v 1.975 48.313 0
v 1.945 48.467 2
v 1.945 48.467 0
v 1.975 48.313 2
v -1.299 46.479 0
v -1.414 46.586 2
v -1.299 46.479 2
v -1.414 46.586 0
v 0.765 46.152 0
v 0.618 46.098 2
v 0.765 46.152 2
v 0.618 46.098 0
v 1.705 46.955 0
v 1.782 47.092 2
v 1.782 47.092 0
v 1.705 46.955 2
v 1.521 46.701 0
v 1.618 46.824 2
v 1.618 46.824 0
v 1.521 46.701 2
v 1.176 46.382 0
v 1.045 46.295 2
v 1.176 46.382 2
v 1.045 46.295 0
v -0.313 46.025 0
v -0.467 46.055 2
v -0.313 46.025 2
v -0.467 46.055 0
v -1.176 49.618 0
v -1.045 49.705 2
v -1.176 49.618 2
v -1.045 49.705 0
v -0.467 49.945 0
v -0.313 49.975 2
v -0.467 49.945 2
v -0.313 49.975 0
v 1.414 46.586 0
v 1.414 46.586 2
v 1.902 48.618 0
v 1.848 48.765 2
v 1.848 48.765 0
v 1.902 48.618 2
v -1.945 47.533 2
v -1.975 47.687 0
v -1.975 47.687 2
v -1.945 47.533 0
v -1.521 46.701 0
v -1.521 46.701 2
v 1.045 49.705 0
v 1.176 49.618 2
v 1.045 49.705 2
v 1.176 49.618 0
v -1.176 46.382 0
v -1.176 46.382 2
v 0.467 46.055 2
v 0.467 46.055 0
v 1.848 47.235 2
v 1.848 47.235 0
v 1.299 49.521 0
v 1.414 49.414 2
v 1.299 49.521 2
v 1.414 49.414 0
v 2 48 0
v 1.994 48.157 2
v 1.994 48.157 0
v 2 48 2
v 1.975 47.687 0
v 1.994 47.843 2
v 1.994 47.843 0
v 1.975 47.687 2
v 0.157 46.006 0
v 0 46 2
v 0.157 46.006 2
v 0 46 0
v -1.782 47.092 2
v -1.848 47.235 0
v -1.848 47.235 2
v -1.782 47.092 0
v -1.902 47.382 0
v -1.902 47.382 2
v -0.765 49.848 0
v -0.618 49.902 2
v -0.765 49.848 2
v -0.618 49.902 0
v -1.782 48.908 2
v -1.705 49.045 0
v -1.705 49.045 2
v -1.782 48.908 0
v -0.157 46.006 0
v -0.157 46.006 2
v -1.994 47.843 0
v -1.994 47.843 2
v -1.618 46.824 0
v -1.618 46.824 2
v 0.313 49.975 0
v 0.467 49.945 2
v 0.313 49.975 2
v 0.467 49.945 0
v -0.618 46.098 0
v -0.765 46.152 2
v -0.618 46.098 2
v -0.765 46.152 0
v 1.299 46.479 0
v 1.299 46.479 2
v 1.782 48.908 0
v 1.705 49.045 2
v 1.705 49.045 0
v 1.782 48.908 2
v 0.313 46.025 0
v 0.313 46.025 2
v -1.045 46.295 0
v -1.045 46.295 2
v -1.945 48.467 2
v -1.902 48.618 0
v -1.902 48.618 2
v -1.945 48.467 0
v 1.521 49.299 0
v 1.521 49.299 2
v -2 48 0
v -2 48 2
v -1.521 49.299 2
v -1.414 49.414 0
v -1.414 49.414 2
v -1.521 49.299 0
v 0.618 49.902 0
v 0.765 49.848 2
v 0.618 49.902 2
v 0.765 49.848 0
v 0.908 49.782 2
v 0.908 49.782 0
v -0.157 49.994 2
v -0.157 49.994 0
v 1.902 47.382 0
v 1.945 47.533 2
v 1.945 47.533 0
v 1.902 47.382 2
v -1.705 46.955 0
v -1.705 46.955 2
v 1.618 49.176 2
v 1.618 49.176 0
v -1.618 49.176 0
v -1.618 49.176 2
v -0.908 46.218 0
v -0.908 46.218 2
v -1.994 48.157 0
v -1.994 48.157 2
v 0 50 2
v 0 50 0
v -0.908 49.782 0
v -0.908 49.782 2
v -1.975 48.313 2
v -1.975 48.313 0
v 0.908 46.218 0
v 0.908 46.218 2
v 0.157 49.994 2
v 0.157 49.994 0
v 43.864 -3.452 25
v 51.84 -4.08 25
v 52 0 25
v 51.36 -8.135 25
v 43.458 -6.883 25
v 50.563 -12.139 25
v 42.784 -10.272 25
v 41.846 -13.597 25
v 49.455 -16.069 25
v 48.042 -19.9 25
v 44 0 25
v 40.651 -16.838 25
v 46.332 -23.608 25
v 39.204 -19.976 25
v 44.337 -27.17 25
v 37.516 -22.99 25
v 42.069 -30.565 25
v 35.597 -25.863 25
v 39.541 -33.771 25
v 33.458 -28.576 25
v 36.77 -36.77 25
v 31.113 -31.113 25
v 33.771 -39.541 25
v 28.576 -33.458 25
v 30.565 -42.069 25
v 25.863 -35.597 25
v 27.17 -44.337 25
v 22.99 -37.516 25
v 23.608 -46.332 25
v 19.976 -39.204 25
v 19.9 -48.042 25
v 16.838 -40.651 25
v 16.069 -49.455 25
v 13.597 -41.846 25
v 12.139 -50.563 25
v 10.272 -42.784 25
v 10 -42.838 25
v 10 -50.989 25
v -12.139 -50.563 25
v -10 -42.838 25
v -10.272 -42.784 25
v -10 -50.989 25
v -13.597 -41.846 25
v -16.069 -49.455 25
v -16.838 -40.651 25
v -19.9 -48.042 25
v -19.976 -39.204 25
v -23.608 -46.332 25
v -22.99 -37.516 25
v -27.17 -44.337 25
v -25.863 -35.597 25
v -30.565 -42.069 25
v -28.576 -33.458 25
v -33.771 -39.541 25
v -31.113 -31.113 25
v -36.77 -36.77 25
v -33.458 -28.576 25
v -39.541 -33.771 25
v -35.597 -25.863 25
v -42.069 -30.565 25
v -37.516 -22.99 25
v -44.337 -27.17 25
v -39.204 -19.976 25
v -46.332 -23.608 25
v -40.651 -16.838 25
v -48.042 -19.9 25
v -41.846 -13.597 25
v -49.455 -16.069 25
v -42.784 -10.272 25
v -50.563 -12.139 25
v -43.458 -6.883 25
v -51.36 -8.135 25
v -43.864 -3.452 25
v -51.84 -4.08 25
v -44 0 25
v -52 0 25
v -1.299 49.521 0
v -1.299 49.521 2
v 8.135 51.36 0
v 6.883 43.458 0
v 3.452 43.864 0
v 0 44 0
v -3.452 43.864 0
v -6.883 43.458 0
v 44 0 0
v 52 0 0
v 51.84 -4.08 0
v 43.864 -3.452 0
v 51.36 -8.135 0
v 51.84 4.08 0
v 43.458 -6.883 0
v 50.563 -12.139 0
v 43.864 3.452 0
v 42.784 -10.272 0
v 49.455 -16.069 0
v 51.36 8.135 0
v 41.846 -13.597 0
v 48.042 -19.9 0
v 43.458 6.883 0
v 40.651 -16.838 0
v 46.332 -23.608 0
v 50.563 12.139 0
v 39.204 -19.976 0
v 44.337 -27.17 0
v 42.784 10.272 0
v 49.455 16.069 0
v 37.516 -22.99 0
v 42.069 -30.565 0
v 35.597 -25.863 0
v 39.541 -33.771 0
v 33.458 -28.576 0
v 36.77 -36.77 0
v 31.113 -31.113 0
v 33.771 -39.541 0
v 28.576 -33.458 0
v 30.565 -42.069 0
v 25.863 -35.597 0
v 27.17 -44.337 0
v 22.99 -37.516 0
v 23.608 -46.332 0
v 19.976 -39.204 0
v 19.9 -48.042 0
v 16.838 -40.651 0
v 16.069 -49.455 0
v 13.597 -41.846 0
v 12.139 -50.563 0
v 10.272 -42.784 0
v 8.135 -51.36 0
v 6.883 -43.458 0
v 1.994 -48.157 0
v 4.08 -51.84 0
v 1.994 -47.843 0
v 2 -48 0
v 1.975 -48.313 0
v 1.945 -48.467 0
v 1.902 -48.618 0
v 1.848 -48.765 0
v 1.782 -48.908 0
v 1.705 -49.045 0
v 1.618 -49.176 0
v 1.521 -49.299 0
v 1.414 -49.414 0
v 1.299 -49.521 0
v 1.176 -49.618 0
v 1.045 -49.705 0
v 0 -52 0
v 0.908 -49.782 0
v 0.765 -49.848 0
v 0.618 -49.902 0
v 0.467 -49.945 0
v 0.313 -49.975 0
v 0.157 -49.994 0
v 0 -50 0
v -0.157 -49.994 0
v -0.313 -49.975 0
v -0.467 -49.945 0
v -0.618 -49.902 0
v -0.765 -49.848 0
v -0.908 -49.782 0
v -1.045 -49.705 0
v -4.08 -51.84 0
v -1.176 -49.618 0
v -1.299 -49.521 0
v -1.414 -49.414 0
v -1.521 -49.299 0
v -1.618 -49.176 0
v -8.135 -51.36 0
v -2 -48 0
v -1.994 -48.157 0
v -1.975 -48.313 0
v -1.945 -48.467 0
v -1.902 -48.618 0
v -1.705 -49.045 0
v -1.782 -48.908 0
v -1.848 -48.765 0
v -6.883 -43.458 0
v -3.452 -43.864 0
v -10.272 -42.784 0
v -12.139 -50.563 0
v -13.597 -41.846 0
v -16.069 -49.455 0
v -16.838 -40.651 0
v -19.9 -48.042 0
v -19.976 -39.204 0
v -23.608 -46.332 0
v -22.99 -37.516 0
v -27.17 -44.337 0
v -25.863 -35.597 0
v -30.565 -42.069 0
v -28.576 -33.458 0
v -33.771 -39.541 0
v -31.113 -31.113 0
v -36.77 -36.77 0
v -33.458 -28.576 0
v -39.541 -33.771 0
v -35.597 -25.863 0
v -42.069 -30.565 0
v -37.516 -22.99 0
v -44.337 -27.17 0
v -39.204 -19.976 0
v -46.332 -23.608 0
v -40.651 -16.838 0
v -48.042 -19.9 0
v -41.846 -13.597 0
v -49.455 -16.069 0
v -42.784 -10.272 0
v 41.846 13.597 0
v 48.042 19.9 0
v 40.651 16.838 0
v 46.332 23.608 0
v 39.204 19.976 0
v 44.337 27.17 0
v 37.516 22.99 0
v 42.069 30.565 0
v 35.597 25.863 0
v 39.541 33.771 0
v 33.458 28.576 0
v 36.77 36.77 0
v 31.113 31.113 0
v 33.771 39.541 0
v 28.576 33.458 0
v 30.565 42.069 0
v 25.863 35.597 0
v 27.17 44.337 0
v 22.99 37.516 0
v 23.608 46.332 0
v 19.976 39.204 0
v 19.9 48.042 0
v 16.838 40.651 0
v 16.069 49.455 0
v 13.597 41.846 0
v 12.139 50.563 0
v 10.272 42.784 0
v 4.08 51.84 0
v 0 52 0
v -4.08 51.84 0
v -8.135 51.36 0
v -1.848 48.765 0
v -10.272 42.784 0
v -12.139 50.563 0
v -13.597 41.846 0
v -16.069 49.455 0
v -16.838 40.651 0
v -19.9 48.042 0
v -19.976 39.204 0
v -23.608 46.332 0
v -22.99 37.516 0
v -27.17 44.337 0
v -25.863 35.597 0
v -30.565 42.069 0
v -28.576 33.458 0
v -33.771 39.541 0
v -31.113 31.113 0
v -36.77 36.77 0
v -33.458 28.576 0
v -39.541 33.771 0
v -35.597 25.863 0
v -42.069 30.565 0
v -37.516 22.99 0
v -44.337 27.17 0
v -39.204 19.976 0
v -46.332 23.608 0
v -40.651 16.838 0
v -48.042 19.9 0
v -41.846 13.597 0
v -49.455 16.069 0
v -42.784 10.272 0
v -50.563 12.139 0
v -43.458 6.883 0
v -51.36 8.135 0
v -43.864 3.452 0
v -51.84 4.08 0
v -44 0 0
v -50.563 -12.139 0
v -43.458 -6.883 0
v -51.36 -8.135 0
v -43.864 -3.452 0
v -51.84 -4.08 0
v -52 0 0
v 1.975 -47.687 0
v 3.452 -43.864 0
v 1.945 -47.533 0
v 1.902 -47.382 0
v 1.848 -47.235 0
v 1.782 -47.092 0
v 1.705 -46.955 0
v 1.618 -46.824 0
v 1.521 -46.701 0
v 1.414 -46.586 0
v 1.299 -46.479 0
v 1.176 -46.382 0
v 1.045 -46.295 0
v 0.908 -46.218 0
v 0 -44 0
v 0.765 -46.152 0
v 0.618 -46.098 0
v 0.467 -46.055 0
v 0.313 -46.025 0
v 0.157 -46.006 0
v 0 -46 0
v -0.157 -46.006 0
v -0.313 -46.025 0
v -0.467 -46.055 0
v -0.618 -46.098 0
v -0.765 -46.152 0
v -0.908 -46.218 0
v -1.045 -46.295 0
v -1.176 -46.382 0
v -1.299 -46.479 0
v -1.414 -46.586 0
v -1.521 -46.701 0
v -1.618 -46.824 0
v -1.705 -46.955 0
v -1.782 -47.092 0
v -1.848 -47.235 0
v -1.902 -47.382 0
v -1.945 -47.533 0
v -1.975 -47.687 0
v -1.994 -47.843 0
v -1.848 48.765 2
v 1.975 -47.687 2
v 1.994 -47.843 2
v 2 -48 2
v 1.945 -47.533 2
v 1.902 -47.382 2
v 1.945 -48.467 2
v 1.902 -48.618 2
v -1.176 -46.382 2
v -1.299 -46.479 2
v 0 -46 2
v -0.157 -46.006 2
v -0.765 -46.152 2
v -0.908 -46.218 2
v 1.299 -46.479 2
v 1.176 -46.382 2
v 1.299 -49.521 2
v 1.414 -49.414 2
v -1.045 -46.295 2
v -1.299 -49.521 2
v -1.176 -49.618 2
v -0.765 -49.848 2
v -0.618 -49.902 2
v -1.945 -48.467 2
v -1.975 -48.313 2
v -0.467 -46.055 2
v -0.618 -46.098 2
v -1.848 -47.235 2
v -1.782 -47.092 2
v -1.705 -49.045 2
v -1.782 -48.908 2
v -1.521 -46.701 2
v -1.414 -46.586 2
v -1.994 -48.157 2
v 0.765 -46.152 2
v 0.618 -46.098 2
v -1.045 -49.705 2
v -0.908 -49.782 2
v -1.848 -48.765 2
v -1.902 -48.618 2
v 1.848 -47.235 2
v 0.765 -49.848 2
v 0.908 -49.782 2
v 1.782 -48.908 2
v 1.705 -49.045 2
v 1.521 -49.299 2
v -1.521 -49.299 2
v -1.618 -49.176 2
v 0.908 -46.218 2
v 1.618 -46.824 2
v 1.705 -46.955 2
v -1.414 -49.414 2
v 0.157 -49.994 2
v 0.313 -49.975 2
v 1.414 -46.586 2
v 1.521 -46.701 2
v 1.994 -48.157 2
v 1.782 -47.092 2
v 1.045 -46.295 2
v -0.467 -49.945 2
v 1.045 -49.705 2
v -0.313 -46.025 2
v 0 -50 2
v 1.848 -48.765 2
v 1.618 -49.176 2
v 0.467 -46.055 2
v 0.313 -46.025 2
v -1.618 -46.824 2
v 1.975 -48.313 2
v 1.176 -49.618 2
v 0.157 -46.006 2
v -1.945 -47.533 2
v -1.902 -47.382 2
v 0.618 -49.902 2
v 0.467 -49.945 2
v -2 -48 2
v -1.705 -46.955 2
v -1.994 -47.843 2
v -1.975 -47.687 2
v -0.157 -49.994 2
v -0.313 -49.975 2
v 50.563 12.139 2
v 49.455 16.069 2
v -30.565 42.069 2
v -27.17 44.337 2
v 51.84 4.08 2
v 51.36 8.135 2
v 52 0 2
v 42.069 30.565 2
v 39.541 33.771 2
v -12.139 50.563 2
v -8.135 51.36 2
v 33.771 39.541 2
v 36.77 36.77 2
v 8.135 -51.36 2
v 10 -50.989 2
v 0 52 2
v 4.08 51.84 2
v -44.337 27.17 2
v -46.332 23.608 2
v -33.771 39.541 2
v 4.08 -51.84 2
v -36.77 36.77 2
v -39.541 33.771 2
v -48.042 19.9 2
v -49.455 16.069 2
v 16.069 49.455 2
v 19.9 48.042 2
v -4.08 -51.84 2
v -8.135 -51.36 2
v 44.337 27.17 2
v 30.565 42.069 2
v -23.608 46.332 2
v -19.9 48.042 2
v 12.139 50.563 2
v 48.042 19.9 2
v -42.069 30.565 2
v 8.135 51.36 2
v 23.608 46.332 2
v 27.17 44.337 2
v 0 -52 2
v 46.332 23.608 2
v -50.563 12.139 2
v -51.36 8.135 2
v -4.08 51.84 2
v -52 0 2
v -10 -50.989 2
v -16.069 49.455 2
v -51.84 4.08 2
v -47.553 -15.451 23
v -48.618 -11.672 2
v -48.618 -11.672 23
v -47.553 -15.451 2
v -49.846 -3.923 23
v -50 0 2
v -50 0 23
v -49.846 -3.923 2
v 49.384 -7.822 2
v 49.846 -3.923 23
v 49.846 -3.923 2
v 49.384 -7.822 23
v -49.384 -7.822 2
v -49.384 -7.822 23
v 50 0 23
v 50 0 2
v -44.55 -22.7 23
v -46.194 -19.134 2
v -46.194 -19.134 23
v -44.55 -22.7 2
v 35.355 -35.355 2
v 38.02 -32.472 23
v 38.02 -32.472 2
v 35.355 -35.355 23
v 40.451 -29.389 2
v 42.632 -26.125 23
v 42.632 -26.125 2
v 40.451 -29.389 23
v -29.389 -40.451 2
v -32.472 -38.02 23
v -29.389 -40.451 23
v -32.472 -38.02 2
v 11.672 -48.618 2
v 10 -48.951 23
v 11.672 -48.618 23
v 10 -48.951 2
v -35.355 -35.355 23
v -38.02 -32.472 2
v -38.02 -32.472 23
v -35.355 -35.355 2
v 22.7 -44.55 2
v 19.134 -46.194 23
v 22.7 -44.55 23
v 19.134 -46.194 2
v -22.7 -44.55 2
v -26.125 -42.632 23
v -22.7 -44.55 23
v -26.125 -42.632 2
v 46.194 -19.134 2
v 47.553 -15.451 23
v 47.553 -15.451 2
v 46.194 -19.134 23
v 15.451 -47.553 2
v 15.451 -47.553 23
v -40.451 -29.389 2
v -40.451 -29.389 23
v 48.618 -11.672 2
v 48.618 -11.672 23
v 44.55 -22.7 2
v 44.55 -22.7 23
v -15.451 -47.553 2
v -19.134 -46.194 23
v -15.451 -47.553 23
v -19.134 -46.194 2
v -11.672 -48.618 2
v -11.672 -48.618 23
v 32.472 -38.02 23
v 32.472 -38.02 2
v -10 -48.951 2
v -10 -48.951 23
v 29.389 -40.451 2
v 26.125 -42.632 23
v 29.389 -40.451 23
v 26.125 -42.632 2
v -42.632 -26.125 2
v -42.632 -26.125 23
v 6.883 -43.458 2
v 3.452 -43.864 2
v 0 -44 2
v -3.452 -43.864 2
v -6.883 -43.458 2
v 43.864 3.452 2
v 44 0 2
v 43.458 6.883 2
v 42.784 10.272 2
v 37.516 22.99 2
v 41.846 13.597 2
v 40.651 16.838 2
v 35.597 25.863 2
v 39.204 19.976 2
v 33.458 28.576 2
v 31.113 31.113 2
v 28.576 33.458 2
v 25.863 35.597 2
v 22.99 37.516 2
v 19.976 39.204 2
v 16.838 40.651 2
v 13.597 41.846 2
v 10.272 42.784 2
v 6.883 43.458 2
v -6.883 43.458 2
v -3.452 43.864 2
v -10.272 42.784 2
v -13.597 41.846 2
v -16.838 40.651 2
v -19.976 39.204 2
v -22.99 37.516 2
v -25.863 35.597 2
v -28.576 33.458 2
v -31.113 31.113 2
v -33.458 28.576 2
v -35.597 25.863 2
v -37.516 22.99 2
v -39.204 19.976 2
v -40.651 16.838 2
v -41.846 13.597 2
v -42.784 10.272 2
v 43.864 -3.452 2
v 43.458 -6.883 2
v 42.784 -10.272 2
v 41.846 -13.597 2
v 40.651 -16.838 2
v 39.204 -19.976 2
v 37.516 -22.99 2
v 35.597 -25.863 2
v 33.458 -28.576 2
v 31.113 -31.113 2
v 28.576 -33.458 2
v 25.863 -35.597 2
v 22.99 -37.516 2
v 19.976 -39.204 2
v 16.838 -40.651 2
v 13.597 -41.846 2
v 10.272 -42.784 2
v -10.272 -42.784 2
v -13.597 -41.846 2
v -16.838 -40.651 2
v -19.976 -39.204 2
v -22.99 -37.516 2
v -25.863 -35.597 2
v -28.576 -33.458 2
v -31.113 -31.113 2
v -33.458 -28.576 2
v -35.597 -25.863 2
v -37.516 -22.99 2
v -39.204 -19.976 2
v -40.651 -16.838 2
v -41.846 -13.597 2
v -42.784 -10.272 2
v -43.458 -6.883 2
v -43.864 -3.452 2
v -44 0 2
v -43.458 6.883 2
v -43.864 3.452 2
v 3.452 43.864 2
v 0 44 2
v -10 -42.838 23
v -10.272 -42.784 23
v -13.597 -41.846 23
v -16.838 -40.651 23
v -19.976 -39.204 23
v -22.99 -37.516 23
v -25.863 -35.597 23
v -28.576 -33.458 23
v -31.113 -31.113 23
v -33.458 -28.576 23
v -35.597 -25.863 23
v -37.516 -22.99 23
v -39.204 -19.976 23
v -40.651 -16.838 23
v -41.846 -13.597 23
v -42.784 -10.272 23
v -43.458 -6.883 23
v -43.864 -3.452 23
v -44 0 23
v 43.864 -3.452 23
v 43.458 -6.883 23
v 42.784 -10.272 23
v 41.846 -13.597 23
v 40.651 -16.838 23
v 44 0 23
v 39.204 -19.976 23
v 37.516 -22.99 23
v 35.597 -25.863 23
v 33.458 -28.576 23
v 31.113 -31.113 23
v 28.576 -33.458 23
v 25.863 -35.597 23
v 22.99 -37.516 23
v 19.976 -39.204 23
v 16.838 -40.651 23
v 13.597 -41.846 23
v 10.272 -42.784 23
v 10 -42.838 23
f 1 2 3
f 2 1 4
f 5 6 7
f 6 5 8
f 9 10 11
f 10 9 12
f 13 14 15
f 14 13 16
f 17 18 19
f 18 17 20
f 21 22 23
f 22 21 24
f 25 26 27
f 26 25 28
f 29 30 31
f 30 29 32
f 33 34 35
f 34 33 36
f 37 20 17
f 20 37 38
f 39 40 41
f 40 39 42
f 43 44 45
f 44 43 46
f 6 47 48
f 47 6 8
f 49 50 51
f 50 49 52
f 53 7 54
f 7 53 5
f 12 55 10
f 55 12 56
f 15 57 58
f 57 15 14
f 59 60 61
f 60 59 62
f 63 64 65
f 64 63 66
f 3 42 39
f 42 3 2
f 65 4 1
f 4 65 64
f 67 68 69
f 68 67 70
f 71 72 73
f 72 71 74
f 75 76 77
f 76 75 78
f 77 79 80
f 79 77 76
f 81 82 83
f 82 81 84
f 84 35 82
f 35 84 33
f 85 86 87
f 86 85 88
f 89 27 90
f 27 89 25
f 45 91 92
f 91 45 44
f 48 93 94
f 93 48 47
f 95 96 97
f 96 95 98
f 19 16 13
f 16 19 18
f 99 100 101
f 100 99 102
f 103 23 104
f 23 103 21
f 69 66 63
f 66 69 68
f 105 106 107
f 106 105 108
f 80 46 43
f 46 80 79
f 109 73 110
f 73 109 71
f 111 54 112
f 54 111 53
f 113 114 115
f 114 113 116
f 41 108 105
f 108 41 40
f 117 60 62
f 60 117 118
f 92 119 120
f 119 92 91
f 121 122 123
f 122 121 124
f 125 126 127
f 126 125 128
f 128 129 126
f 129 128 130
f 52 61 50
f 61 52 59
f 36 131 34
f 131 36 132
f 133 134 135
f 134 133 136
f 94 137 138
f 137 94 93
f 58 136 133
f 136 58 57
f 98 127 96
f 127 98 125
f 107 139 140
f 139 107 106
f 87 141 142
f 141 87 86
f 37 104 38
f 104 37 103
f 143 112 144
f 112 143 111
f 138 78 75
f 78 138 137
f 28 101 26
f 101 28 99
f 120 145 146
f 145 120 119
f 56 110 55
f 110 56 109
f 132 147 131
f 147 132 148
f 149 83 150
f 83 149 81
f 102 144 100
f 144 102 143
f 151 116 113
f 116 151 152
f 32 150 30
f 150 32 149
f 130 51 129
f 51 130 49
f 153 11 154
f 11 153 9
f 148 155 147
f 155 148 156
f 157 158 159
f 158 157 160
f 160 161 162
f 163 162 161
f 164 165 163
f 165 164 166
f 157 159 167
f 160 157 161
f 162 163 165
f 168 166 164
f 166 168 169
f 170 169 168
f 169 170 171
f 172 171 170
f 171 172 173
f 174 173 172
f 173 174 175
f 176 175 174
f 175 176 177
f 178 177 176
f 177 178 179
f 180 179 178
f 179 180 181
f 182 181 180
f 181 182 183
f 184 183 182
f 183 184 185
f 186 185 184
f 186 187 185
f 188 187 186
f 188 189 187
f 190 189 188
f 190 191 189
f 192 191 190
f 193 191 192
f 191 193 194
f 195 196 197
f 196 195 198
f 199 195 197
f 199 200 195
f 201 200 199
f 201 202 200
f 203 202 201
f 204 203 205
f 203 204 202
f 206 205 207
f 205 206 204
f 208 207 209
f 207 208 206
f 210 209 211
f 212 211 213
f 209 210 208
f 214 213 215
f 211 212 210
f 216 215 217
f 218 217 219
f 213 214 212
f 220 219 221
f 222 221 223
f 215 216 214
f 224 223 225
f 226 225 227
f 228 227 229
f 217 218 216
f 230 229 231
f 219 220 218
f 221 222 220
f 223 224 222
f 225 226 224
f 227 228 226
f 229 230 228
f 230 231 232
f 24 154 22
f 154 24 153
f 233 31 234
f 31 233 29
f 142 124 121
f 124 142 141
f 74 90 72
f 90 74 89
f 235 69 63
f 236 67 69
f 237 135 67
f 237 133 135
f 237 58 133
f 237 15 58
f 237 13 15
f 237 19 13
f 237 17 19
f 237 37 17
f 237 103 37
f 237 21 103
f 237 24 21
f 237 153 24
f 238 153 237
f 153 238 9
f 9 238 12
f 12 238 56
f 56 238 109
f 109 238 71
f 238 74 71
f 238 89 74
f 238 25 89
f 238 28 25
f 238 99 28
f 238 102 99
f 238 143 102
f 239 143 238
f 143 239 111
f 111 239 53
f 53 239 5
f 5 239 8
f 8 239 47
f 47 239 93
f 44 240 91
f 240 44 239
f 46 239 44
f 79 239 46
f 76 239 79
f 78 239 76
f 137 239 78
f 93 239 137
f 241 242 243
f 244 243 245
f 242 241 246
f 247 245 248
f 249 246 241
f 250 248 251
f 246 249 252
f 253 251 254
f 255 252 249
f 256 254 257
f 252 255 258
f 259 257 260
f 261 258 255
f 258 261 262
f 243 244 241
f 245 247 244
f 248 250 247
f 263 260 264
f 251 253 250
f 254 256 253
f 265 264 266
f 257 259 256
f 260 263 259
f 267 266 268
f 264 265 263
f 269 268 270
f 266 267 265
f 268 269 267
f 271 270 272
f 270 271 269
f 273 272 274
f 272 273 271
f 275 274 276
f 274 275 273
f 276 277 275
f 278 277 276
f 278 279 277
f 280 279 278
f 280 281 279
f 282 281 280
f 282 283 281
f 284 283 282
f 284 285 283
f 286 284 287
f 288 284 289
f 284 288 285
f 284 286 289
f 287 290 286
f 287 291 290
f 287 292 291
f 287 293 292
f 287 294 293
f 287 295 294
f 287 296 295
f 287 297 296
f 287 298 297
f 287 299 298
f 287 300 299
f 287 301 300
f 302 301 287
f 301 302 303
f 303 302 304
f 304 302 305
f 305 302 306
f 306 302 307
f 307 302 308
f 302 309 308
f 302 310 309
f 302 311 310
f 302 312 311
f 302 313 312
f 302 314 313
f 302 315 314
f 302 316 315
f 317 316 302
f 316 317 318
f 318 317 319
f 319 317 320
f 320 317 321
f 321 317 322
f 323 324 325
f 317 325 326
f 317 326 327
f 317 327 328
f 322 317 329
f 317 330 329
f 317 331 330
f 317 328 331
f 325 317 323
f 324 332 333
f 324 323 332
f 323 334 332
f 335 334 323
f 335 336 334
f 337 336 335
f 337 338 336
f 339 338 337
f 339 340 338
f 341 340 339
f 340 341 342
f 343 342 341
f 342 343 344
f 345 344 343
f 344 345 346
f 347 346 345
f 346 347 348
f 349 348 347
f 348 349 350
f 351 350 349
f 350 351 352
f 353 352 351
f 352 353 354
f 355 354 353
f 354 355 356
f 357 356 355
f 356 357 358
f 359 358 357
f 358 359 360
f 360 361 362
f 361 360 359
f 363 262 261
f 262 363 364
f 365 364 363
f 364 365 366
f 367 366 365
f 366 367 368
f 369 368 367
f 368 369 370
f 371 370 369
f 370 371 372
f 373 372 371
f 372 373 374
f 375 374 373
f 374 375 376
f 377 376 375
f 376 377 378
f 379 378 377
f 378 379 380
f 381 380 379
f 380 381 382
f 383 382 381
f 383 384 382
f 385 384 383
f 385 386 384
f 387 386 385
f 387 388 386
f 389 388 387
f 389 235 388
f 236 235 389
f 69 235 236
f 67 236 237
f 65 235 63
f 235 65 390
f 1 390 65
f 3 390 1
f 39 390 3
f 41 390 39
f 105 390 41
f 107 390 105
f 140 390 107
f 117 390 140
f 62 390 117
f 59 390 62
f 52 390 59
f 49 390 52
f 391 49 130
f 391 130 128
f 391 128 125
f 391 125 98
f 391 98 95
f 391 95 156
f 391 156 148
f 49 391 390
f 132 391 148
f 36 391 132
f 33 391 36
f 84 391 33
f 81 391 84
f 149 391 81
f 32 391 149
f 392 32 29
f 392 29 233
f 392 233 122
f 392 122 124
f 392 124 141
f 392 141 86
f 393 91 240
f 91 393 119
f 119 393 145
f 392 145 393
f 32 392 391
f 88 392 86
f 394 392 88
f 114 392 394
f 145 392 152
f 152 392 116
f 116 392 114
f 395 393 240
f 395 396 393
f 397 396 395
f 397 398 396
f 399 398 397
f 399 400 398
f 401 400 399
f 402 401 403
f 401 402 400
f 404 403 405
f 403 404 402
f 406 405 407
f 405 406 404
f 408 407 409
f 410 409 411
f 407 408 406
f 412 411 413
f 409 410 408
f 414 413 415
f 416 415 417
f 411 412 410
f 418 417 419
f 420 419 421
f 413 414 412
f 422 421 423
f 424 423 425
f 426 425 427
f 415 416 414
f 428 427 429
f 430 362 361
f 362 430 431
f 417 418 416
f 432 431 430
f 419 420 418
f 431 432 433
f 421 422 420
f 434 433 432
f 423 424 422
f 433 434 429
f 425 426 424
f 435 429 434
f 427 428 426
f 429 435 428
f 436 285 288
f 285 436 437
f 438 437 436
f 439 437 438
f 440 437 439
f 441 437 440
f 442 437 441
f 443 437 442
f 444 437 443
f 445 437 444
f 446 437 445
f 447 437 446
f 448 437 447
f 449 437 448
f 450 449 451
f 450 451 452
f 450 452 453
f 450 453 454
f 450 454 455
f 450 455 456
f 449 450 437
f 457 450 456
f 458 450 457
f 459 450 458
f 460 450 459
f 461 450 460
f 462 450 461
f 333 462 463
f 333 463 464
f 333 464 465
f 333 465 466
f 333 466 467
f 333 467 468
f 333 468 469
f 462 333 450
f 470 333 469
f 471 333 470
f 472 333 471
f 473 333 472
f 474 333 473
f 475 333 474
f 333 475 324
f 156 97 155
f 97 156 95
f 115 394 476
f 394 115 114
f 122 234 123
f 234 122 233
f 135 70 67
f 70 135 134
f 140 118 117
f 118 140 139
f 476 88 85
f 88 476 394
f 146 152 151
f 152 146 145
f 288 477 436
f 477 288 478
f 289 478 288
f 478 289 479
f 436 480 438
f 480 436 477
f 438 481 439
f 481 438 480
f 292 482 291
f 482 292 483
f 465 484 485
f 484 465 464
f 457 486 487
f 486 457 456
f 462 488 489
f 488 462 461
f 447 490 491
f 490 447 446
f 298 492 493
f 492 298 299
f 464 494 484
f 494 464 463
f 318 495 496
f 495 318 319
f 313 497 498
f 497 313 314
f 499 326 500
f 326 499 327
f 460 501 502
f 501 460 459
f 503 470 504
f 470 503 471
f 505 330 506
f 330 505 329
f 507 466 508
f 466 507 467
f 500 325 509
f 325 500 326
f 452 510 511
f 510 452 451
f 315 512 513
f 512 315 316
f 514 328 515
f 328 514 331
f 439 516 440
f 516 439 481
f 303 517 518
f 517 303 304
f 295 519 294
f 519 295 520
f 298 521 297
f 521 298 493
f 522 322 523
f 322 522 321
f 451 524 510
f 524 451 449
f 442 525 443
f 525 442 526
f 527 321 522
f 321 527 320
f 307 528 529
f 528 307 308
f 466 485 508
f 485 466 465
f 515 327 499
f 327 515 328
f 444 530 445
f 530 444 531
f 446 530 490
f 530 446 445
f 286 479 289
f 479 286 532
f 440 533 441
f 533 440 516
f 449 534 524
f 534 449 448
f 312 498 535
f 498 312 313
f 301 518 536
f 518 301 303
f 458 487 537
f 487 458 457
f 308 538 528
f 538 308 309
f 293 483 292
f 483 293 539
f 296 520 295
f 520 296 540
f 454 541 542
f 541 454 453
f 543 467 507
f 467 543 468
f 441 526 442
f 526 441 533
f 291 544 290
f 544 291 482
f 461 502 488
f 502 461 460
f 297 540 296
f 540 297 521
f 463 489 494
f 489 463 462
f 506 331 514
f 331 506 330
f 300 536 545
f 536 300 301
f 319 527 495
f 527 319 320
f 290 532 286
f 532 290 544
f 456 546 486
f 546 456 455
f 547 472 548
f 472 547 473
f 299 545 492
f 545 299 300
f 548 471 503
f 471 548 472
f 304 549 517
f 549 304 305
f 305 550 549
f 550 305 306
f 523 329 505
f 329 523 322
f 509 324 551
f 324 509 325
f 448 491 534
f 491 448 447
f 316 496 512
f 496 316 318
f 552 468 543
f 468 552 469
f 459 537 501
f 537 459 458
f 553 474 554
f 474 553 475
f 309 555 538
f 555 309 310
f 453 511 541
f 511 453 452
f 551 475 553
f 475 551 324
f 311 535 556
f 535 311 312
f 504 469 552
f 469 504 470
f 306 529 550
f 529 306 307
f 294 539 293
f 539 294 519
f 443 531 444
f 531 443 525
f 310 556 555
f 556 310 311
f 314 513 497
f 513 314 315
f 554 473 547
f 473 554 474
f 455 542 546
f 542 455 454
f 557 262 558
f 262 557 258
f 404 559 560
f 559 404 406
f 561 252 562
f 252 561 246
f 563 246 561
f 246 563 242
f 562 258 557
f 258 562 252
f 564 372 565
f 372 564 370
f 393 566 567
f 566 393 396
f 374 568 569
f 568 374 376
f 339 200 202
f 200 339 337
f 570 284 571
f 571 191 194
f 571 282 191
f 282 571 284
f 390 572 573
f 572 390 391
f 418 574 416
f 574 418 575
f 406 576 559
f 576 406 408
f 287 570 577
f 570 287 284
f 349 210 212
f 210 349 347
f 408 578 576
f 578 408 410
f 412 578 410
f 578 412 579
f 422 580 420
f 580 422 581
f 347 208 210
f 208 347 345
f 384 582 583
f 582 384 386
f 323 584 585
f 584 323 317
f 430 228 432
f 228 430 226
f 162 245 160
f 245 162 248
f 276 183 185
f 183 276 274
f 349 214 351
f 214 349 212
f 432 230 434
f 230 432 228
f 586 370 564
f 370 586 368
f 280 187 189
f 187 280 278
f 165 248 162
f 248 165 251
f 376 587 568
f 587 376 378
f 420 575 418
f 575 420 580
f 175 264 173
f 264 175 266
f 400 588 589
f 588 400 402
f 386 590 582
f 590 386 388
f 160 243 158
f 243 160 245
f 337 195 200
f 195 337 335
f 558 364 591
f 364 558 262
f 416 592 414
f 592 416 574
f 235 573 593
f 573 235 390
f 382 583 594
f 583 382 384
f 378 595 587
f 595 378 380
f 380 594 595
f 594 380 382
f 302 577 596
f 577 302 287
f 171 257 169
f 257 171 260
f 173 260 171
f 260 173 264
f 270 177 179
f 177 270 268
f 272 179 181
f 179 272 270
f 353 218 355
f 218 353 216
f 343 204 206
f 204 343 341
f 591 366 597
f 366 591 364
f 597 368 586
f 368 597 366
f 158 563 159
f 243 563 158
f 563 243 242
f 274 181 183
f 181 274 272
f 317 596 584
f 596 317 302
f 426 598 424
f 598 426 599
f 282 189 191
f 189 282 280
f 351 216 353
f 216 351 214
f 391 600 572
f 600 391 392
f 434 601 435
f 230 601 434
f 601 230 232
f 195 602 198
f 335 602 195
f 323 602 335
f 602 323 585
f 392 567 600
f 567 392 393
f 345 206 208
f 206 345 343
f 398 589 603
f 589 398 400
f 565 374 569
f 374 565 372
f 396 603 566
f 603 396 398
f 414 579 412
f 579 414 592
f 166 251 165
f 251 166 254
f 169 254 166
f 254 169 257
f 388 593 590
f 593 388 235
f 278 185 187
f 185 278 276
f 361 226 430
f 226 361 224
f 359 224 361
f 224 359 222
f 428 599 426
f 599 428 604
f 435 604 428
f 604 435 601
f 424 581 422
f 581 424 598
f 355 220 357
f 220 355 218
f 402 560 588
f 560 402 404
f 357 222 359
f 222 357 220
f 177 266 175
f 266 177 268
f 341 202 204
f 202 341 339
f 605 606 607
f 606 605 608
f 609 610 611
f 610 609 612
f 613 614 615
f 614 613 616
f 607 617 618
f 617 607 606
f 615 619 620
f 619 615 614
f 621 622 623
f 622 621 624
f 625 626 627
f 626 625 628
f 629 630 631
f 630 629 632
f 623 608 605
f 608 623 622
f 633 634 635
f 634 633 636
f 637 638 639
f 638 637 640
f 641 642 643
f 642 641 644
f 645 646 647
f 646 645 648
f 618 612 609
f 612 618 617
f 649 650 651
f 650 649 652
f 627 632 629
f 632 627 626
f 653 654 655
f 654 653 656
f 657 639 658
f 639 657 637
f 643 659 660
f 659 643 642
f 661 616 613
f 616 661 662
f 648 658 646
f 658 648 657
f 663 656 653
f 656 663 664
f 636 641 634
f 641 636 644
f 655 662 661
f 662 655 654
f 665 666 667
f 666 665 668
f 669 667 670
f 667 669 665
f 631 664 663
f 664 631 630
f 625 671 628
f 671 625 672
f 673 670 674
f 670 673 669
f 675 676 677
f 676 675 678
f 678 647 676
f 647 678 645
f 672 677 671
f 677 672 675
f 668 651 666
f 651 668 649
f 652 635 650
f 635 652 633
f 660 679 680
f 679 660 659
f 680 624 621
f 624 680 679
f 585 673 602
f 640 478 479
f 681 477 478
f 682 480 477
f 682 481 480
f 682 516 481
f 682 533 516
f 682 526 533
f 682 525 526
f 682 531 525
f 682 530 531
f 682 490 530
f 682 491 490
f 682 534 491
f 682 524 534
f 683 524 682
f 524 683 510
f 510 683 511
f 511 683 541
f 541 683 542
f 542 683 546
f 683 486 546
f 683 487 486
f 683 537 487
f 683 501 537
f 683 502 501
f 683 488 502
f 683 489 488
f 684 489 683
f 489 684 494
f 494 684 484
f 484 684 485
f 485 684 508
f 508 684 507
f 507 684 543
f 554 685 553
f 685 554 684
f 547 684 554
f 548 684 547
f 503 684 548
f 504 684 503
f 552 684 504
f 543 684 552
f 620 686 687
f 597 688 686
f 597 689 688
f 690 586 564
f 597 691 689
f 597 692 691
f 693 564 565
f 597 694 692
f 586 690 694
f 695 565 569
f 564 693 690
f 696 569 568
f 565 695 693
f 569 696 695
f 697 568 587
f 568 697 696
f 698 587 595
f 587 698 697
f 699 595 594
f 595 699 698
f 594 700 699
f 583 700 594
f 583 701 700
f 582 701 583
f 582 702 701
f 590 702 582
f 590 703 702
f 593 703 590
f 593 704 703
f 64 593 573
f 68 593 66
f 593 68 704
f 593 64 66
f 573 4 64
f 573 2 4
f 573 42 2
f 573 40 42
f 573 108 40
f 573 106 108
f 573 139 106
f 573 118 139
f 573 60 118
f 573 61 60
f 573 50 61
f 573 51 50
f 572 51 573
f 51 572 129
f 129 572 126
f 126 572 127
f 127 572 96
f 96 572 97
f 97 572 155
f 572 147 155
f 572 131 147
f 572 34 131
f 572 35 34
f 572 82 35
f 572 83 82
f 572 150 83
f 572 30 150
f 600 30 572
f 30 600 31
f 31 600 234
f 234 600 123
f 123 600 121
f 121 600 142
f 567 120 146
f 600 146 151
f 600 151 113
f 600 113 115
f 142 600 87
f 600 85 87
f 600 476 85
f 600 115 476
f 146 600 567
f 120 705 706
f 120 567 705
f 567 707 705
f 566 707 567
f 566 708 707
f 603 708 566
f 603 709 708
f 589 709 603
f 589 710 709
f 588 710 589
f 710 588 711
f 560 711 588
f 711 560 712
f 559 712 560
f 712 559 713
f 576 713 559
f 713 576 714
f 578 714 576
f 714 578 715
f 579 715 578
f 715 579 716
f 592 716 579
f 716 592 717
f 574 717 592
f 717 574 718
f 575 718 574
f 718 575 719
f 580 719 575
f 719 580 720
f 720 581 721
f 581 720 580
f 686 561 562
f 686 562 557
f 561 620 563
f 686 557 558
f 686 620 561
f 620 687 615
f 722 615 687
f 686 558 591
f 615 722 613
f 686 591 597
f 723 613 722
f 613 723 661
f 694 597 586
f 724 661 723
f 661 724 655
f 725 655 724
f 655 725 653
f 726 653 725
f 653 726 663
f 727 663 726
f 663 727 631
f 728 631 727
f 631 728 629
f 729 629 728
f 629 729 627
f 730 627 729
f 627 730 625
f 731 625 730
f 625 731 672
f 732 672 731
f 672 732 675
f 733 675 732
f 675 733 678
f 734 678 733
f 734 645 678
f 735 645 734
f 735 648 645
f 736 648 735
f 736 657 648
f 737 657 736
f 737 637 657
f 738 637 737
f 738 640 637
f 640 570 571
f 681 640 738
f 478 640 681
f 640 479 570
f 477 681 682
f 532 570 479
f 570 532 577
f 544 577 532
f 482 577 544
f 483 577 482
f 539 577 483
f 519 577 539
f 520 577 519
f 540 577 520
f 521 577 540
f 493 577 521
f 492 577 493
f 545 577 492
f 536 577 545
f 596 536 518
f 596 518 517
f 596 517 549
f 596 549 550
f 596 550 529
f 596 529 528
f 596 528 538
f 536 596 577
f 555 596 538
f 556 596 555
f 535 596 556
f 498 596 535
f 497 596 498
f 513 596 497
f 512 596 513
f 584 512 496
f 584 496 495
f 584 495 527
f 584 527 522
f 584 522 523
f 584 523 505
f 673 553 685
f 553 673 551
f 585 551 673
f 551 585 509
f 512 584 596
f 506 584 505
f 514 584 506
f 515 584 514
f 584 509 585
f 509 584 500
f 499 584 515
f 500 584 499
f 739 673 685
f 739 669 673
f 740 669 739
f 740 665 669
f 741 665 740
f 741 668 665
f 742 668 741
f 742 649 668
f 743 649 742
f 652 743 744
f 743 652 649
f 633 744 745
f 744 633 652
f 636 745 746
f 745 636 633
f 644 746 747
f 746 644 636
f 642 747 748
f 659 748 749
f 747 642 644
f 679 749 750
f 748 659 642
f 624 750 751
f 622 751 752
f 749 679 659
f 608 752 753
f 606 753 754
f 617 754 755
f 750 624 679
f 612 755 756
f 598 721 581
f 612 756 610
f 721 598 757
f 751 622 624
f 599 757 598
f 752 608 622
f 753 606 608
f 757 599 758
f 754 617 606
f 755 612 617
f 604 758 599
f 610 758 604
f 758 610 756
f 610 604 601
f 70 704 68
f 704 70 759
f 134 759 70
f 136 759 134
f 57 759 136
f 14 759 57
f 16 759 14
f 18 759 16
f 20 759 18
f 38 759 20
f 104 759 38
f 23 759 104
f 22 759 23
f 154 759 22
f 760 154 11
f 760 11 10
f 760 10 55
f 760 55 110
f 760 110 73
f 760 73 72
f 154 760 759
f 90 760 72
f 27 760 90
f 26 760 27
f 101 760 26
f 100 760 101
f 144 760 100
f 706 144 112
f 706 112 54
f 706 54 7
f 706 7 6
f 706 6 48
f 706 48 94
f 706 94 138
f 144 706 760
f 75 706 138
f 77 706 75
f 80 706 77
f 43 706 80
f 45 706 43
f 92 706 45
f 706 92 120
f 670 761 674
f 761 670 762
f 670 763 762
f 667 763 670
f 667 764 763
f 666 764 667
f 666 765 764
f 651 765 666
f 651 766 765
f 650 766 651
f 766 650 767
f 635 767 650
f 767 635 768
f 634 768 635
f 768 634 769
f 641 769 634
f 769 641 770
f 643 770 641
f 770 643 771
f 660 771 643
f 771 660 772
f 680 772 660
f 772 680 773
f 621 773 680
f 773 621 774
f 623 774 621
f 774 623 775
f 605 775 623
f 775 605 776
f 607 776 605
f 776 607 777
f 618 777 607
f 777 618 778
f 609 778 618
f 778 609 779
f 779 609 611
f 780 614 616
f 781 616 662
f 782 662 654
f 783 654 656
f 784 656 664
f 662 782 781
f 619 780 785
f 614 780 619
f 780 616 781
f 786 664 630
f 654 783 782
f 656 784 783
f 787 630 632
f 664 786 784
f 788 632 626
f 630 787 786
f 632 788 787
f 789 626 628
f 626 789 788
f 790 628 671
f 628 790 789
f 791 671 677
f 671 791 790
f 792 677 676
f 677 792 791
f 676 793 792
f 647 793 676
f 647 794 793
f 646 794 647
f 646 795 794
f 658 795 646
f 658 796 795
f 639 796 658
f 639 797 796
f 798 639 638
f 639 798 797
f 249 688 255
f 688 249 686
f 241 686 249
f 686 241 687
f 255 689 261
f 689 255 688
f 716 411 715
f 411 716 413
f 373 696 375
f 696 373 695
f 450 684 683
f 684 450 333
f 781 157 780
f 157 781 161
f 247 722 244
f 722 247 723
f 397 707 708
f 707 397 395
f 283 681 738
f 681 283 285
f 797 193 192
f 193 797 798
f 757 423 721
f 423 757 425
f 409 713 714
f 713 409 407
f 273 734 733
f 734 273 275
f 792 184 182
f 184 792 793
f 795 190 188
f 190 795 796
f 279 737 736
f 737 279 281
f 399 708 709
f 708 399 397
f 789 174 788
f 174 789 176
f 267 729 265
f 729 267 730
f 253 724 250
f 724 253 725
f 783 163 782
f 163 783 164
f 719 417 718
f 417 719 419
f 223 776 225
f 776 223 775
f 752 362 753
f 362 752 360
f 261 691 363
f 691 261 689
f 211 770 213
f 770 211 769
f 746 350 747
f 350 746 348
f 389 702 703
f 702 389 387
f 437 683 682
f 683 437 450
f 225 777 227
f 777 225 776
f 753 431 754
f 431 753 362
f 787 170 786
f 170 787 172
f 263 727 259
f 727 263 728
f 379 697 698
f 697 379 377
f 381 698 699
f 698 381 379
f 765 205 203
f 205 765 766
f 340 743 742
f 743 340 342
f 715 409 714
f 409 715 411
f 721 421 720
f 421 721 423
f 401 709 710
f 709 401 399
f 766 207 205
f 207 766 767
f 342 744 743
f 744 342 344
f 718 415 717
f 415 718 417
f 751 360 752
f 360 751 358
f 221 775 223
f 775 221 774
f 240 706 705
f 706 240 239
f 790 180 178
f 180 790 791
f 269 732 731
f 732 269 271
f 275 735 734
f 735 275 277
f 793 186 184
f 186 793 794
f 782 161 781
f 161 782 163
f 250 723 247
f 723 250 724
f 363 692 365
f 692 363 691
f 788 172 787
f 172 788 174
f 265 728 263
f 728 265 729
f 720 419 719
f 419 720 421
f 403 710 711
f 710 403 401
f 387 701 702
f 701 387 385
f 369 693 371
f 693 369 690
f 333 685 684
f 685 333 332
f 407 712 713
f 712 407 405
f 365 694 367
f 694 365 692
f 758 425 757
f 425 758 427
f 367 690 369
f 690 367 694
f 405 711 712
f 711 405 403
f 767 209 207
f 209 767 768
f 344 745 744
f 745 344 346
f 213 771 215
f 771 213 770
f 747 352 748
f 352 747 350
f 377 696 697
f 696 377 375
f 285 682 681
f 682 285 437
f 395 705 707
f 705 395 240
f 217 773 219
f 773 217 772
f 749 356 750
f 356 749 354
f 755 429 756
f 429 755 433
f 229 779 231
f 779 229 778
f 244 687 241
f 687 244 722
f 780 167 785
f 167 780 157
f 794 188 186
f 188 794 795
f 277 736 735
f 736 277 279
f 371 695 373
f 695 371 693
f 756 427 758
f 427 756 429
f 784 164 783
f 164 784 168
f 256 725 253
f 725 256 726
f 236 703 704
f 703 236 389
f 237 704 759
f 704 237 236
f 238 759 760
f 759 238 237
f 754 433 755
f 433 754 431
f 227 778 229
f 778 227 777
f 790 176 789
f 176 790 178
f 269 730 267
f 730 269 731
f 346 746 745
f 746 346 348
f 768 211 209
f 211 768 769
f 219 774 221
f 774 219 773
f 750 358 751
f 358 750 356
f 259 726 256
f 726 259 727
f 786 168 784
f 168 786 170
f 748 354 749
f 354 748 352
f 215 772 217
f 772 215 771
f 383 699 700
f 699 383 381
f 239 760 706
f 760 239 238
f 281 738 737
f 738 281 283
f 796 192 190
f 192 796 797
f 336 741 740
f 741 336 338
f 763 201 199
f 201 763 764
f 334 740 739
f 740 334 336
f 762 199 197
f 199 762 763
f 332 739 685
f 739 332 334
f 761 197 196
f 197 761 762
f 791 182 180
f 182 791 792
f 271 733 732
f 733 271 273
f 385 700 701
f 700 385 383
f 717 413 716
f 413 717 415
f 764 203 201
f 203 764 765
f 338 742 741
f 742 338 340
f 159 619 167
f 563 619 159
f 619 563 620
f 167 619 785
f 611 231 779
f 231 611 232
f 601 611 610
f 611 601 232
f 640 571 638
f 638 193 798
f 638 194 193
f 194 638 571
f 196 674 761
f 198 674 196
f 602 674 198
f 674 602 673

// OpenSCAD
t = 2;
r = 100/2;
h = 21;
screw_r = 2;
$fn = 80;

difference(){
	cylinder(h=h+2*t,r=r+t);
	translate([0,0,t])
	cylinder(h=h,r=r);
	cylinder(h=h+2*t,r=r-3*screw_r);
	for(y = [r+t-2*screw_r,-(r+t-2*screw_r)]) {
		translate([0,y,0])
		cylinder(h=h+2*t,r=screw_r);
	}
	translate([-(r+t),0,t])
	cube([2*(r+t),r+t,h+2*t]);
	translate([-5*t,-(r+t),t])
	cube([10*t,r+t,h+2*t]);
}
